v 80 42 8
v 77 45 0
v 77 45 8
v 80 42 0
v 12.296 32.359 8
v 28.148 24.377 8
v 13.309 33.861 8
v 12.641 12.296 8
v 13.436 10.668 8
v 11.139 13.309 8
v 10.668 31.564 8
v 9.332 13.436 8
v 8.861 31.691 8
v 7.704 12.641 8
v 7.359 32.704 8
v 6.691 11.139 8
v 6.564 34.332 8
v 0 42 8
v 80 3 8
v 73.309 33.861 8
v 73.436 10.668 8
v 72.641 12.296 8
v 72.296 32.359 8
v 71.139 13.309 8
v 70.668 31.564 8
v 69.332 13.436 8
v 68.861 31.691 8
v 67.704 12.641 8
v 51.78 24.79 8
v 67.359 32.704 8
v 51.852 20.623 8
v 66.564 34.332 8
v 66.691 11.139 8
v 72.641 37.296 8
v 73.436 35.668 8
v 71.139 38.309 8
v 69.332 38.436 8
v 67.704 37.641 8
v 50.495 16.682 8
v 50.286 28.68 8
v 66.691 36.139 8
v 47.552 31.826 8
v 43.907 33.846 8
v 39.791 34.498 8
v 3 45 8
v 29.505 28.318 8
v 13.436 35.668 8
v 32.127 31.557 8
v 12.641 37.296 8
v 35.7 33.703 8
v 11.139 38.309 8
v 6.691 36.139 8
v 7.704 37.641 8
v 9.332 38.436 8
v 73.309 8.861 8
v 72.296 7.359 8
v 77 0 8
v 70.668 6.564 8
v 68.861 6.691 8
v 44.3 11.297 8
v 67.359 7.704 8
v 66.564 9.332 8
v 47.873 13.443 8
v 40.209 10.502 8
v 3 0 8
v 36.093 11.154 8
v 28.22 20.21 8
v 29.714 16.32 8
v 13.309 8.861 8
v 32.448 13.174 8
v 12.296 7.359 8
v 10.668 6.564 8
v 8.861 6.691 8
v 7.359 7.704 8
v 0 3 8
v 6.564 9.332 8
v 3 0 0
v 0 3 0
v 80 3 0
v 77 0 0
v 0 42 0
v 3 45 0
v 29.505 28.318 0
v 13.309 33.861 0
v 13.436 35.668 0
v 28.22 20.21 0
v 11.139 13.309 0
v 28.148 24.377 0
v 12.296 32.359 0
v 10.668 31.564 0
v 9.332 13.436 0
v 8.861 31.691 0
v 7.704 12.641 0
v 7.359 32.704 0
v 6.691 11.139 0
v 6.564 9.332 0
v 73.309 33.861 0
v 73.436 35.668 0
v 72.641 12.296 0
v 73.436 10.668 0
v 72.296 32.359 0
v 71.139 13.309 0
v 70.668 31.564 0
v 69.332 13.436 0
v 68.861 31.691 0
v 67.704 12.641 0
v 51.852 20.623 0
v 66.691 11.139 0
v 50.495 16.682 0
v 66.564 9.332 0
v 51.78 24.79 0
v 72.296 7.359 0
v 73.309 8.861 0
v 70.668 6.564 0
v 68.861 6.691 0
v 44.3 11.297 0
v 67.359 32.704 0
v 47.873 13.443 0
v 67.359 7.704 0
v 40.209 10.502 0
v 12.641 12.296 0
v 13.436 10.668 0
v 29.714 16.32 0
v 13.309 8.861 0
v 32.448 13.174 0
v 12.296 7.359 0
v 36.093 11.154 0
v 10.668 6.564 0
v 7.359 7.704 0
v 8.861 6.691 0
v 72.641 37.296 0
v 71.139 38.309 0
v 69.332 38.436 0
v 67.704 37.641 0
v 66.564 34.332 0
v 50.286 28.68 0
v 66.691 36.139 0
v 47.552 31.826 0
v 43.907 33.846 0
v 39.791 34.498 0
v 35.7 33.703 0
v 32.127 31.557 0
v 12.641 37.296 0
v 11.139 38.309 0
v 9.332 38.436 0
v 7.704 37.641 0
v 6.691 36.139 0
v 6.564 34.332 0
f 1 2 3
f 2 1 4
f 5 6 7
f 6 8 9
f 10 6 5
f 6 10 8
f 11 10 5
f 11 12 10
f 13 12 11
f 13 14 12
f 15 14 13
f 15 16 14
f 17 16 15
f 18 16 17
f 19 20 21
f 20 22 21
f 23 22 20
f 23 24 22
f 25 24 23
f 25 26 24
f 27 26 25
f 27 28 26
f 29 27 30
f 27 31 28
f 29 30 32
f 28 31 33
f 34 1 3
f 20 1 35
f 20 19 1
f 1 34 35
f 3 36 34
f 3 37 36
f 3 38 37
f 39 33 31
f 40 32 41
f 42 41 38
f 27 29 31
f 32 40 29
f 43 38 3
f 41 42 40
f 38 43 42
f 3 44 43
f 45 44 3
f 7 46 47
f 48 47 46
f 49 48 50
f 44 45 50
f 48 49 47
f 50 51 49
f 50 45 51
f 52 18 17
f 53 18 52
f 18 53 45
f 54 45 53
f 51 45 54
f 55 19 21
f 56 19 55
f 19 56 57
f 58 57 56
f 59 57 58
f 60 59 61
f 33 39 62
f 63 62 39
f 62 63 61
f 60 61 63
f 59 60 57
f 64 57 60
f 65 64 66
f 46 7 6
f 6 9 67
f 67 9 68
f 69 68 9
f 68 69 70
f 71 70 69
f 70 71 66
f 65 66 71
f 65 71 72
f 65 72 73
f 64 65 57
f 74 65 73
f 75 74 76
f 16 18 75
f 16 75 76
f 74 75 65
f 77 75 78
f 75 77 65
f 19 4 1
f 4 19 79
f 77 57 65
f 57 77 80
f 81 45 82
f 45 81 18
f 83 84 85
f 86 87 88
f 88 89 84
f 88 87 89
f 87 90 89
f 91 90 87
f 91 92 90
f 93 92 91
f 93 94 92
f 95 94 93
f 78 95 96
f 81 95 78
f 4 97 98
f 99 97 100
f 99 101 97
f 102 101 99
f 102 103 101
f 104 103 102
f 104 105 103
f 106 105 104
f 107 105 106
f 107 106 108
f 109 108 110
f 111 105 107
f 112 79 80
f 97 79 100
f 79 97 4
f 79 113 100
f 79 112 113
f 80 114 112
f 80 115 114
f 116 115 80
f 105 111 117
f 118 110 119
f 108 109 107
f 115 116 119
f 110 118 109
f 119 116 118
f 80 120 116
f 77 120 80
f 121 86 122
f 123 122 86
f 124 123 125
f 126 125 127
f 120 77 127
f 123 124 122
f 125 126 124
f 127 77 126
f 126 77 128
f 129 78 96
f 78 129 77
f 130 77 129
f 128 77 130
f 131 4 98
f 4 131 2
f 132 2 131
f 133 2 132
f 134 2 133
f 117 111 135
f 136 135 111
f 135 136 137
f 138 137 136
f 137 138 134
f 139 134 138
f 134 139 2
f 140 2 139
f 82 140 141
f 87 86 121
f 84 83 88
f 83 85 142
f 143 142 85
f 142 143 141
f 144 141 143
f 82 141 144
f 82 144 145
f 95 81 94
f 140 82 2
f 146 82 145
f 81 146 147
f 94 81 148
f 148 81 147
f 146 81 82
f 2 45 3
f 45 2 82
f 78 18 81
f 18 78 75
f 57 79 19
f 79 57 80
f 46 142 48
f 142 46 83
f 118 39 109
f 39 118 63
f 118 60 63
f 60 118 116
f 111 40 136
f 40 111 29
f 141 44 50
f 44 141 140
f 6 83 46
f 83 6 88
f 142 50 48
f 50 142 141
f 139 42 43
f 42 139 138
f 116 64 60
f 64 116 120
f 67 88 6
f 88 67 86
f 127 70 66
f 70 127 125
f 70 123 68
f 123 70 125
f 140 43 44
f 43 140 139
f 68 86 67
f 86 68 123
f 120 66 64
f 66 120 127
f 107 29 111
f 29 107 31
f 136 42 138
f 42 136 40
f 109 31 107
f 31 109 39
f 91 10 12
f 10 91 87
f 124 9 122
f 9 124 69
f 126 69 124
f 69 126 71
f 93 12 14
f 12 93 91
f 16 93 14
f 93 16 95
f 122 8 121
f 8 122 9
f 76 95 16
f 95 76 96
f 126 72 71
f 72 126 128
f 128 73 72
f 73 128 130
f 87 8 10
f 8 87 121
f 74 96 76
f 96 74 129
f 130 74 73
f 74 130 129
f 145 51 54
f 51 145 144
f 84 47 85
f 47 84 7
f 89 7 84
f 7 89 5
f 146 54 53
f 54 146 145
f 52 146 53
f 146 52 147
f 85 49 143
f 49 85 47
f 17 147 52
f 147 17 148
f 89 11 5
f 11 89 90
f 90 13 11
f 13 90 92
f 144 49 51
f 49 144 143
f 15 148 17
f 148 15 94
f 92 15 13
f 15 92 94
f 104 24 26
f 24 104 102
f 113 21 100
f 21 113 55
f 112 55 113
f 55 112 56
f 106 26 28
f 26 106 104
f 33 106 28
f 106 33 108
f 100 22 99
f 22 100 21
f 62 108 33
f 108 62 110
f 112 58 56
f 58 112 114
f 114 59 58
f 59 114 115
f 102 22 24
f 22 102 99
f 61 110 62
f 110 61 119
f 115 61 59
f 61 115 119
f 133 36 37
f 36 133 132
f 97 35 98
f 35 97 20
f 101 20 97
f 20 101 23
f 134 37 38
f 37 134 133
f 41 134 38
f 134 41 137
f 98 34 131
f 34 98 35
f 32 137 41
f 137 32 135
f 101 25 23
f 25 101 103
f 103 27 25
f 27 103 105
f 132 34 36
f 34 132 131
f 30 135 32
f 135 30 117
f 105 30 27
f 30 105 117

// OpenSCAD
$fn = 32;

// ----------------------------------------------------------------------
// Spacer plate: rect 80 x 45
// ----------------------------------------------------------------------

// --- parameters (mm) ---
bore_r = 12;              // centre bore radius
bolt_r = 3.5;             // bolt hole radius
plate_t = 8;              // plate thickness, Z (extrusion height)
plate_l = 80;             // plate length, X
plate_w = 45;             // plate width, Y
inset = 10;               // corner hole inset

profile = [[3, 0], [77, 0], [80, 3], [80, 42], [77, 45], [3, 45], [0, 42], [0, 3]];  // primary outline, 8 points, counter clockwise
void_1 = [[51.78, 24.79], [50.286, 28.68], [47.552, 31.826], [43.907, 33.846], [39.791, 34.498], [35.7, 33.703], [32.127, 31.557], [29.505, 28.318], [28.148, 24.377], [28.22, 20.21], [29.714, 16.32], [32.448, 13.174], [36.093, 11.154], [40.209, 10.502], [44.3, 11.297], [47.873, 13.443], [50.495, 16.682], [51.852, 20.623]];  // centre bore, 18 points
void_2 = [[13.436, 10.668], [12.641, 12.296], [11.139, 13.309], [9.332, 13.436], [7.704, 12.641], [6.691, 11.139], [6.564, 9.332], [7.359, 7.704], [8.861, 6.691], [10.668, 6.564], [12.296, 7.359], [13.309, 8.861]];  // corner hole, 12 points
void_3 = [[13.436, 35.668], [12.641, 37.296], [11.139, 38.309], [9.332, 38.436], [7.704, 37.641], [6.691, 36.139], [6.564, 34.332], [7.359, 32.704], [8.861, 31.691], [10.668, 31.564], [12.296, 32.359], [13.309, 33.861]];  // corner hole, 12 points
void_4 = [[73.436, 10.668], [72.641, 12.296], [71.139, 13.309], [69.332, 13.436], [67.704, 12.641], [66.691, 11.139], [66.564, 9.332], [67.359, 7.704], [68.861, 6.691], [70.668, 6.564], [72.296, 7.359], [73.309, 8.861]];  // corner hole, 12 points
void_5 = [[73.436, 35.668], [72.641, 37.296], [71.139, 38.309], [69.332, 38.436], [67.704, 37.641], [66.691, 36.139], [66.564, 34.332], [67.359, 32.704], [68.861, 31.691], [70.668, 31.564], [72.296, 32.359], [73.309, 33.861]];  // corner hole, 12 points

// --- the one profile operation ---
difference() {
  linear_extrude(height = plate_t) polygon(points = profile);
  translate([0, 0, -1])
    linear_extrude(height = plate_t + 2) polygon(points = void_1);
  translate([0, 0, -1])
    linear_extrude(height = plate_t + 2) polygon(points = void_2);
  translate([0, 0, -1])
    linear_extrude(height = plate_t + 2) polygon(points = void_3);
  translate([0, 0, -1])
    linear_extrude(height = plate_t + 2) polygon(points = void_4);
  translate([0, 0, -1])
    linear_extrude(height = plate_t + 2) polygon(points = void_5);
}
